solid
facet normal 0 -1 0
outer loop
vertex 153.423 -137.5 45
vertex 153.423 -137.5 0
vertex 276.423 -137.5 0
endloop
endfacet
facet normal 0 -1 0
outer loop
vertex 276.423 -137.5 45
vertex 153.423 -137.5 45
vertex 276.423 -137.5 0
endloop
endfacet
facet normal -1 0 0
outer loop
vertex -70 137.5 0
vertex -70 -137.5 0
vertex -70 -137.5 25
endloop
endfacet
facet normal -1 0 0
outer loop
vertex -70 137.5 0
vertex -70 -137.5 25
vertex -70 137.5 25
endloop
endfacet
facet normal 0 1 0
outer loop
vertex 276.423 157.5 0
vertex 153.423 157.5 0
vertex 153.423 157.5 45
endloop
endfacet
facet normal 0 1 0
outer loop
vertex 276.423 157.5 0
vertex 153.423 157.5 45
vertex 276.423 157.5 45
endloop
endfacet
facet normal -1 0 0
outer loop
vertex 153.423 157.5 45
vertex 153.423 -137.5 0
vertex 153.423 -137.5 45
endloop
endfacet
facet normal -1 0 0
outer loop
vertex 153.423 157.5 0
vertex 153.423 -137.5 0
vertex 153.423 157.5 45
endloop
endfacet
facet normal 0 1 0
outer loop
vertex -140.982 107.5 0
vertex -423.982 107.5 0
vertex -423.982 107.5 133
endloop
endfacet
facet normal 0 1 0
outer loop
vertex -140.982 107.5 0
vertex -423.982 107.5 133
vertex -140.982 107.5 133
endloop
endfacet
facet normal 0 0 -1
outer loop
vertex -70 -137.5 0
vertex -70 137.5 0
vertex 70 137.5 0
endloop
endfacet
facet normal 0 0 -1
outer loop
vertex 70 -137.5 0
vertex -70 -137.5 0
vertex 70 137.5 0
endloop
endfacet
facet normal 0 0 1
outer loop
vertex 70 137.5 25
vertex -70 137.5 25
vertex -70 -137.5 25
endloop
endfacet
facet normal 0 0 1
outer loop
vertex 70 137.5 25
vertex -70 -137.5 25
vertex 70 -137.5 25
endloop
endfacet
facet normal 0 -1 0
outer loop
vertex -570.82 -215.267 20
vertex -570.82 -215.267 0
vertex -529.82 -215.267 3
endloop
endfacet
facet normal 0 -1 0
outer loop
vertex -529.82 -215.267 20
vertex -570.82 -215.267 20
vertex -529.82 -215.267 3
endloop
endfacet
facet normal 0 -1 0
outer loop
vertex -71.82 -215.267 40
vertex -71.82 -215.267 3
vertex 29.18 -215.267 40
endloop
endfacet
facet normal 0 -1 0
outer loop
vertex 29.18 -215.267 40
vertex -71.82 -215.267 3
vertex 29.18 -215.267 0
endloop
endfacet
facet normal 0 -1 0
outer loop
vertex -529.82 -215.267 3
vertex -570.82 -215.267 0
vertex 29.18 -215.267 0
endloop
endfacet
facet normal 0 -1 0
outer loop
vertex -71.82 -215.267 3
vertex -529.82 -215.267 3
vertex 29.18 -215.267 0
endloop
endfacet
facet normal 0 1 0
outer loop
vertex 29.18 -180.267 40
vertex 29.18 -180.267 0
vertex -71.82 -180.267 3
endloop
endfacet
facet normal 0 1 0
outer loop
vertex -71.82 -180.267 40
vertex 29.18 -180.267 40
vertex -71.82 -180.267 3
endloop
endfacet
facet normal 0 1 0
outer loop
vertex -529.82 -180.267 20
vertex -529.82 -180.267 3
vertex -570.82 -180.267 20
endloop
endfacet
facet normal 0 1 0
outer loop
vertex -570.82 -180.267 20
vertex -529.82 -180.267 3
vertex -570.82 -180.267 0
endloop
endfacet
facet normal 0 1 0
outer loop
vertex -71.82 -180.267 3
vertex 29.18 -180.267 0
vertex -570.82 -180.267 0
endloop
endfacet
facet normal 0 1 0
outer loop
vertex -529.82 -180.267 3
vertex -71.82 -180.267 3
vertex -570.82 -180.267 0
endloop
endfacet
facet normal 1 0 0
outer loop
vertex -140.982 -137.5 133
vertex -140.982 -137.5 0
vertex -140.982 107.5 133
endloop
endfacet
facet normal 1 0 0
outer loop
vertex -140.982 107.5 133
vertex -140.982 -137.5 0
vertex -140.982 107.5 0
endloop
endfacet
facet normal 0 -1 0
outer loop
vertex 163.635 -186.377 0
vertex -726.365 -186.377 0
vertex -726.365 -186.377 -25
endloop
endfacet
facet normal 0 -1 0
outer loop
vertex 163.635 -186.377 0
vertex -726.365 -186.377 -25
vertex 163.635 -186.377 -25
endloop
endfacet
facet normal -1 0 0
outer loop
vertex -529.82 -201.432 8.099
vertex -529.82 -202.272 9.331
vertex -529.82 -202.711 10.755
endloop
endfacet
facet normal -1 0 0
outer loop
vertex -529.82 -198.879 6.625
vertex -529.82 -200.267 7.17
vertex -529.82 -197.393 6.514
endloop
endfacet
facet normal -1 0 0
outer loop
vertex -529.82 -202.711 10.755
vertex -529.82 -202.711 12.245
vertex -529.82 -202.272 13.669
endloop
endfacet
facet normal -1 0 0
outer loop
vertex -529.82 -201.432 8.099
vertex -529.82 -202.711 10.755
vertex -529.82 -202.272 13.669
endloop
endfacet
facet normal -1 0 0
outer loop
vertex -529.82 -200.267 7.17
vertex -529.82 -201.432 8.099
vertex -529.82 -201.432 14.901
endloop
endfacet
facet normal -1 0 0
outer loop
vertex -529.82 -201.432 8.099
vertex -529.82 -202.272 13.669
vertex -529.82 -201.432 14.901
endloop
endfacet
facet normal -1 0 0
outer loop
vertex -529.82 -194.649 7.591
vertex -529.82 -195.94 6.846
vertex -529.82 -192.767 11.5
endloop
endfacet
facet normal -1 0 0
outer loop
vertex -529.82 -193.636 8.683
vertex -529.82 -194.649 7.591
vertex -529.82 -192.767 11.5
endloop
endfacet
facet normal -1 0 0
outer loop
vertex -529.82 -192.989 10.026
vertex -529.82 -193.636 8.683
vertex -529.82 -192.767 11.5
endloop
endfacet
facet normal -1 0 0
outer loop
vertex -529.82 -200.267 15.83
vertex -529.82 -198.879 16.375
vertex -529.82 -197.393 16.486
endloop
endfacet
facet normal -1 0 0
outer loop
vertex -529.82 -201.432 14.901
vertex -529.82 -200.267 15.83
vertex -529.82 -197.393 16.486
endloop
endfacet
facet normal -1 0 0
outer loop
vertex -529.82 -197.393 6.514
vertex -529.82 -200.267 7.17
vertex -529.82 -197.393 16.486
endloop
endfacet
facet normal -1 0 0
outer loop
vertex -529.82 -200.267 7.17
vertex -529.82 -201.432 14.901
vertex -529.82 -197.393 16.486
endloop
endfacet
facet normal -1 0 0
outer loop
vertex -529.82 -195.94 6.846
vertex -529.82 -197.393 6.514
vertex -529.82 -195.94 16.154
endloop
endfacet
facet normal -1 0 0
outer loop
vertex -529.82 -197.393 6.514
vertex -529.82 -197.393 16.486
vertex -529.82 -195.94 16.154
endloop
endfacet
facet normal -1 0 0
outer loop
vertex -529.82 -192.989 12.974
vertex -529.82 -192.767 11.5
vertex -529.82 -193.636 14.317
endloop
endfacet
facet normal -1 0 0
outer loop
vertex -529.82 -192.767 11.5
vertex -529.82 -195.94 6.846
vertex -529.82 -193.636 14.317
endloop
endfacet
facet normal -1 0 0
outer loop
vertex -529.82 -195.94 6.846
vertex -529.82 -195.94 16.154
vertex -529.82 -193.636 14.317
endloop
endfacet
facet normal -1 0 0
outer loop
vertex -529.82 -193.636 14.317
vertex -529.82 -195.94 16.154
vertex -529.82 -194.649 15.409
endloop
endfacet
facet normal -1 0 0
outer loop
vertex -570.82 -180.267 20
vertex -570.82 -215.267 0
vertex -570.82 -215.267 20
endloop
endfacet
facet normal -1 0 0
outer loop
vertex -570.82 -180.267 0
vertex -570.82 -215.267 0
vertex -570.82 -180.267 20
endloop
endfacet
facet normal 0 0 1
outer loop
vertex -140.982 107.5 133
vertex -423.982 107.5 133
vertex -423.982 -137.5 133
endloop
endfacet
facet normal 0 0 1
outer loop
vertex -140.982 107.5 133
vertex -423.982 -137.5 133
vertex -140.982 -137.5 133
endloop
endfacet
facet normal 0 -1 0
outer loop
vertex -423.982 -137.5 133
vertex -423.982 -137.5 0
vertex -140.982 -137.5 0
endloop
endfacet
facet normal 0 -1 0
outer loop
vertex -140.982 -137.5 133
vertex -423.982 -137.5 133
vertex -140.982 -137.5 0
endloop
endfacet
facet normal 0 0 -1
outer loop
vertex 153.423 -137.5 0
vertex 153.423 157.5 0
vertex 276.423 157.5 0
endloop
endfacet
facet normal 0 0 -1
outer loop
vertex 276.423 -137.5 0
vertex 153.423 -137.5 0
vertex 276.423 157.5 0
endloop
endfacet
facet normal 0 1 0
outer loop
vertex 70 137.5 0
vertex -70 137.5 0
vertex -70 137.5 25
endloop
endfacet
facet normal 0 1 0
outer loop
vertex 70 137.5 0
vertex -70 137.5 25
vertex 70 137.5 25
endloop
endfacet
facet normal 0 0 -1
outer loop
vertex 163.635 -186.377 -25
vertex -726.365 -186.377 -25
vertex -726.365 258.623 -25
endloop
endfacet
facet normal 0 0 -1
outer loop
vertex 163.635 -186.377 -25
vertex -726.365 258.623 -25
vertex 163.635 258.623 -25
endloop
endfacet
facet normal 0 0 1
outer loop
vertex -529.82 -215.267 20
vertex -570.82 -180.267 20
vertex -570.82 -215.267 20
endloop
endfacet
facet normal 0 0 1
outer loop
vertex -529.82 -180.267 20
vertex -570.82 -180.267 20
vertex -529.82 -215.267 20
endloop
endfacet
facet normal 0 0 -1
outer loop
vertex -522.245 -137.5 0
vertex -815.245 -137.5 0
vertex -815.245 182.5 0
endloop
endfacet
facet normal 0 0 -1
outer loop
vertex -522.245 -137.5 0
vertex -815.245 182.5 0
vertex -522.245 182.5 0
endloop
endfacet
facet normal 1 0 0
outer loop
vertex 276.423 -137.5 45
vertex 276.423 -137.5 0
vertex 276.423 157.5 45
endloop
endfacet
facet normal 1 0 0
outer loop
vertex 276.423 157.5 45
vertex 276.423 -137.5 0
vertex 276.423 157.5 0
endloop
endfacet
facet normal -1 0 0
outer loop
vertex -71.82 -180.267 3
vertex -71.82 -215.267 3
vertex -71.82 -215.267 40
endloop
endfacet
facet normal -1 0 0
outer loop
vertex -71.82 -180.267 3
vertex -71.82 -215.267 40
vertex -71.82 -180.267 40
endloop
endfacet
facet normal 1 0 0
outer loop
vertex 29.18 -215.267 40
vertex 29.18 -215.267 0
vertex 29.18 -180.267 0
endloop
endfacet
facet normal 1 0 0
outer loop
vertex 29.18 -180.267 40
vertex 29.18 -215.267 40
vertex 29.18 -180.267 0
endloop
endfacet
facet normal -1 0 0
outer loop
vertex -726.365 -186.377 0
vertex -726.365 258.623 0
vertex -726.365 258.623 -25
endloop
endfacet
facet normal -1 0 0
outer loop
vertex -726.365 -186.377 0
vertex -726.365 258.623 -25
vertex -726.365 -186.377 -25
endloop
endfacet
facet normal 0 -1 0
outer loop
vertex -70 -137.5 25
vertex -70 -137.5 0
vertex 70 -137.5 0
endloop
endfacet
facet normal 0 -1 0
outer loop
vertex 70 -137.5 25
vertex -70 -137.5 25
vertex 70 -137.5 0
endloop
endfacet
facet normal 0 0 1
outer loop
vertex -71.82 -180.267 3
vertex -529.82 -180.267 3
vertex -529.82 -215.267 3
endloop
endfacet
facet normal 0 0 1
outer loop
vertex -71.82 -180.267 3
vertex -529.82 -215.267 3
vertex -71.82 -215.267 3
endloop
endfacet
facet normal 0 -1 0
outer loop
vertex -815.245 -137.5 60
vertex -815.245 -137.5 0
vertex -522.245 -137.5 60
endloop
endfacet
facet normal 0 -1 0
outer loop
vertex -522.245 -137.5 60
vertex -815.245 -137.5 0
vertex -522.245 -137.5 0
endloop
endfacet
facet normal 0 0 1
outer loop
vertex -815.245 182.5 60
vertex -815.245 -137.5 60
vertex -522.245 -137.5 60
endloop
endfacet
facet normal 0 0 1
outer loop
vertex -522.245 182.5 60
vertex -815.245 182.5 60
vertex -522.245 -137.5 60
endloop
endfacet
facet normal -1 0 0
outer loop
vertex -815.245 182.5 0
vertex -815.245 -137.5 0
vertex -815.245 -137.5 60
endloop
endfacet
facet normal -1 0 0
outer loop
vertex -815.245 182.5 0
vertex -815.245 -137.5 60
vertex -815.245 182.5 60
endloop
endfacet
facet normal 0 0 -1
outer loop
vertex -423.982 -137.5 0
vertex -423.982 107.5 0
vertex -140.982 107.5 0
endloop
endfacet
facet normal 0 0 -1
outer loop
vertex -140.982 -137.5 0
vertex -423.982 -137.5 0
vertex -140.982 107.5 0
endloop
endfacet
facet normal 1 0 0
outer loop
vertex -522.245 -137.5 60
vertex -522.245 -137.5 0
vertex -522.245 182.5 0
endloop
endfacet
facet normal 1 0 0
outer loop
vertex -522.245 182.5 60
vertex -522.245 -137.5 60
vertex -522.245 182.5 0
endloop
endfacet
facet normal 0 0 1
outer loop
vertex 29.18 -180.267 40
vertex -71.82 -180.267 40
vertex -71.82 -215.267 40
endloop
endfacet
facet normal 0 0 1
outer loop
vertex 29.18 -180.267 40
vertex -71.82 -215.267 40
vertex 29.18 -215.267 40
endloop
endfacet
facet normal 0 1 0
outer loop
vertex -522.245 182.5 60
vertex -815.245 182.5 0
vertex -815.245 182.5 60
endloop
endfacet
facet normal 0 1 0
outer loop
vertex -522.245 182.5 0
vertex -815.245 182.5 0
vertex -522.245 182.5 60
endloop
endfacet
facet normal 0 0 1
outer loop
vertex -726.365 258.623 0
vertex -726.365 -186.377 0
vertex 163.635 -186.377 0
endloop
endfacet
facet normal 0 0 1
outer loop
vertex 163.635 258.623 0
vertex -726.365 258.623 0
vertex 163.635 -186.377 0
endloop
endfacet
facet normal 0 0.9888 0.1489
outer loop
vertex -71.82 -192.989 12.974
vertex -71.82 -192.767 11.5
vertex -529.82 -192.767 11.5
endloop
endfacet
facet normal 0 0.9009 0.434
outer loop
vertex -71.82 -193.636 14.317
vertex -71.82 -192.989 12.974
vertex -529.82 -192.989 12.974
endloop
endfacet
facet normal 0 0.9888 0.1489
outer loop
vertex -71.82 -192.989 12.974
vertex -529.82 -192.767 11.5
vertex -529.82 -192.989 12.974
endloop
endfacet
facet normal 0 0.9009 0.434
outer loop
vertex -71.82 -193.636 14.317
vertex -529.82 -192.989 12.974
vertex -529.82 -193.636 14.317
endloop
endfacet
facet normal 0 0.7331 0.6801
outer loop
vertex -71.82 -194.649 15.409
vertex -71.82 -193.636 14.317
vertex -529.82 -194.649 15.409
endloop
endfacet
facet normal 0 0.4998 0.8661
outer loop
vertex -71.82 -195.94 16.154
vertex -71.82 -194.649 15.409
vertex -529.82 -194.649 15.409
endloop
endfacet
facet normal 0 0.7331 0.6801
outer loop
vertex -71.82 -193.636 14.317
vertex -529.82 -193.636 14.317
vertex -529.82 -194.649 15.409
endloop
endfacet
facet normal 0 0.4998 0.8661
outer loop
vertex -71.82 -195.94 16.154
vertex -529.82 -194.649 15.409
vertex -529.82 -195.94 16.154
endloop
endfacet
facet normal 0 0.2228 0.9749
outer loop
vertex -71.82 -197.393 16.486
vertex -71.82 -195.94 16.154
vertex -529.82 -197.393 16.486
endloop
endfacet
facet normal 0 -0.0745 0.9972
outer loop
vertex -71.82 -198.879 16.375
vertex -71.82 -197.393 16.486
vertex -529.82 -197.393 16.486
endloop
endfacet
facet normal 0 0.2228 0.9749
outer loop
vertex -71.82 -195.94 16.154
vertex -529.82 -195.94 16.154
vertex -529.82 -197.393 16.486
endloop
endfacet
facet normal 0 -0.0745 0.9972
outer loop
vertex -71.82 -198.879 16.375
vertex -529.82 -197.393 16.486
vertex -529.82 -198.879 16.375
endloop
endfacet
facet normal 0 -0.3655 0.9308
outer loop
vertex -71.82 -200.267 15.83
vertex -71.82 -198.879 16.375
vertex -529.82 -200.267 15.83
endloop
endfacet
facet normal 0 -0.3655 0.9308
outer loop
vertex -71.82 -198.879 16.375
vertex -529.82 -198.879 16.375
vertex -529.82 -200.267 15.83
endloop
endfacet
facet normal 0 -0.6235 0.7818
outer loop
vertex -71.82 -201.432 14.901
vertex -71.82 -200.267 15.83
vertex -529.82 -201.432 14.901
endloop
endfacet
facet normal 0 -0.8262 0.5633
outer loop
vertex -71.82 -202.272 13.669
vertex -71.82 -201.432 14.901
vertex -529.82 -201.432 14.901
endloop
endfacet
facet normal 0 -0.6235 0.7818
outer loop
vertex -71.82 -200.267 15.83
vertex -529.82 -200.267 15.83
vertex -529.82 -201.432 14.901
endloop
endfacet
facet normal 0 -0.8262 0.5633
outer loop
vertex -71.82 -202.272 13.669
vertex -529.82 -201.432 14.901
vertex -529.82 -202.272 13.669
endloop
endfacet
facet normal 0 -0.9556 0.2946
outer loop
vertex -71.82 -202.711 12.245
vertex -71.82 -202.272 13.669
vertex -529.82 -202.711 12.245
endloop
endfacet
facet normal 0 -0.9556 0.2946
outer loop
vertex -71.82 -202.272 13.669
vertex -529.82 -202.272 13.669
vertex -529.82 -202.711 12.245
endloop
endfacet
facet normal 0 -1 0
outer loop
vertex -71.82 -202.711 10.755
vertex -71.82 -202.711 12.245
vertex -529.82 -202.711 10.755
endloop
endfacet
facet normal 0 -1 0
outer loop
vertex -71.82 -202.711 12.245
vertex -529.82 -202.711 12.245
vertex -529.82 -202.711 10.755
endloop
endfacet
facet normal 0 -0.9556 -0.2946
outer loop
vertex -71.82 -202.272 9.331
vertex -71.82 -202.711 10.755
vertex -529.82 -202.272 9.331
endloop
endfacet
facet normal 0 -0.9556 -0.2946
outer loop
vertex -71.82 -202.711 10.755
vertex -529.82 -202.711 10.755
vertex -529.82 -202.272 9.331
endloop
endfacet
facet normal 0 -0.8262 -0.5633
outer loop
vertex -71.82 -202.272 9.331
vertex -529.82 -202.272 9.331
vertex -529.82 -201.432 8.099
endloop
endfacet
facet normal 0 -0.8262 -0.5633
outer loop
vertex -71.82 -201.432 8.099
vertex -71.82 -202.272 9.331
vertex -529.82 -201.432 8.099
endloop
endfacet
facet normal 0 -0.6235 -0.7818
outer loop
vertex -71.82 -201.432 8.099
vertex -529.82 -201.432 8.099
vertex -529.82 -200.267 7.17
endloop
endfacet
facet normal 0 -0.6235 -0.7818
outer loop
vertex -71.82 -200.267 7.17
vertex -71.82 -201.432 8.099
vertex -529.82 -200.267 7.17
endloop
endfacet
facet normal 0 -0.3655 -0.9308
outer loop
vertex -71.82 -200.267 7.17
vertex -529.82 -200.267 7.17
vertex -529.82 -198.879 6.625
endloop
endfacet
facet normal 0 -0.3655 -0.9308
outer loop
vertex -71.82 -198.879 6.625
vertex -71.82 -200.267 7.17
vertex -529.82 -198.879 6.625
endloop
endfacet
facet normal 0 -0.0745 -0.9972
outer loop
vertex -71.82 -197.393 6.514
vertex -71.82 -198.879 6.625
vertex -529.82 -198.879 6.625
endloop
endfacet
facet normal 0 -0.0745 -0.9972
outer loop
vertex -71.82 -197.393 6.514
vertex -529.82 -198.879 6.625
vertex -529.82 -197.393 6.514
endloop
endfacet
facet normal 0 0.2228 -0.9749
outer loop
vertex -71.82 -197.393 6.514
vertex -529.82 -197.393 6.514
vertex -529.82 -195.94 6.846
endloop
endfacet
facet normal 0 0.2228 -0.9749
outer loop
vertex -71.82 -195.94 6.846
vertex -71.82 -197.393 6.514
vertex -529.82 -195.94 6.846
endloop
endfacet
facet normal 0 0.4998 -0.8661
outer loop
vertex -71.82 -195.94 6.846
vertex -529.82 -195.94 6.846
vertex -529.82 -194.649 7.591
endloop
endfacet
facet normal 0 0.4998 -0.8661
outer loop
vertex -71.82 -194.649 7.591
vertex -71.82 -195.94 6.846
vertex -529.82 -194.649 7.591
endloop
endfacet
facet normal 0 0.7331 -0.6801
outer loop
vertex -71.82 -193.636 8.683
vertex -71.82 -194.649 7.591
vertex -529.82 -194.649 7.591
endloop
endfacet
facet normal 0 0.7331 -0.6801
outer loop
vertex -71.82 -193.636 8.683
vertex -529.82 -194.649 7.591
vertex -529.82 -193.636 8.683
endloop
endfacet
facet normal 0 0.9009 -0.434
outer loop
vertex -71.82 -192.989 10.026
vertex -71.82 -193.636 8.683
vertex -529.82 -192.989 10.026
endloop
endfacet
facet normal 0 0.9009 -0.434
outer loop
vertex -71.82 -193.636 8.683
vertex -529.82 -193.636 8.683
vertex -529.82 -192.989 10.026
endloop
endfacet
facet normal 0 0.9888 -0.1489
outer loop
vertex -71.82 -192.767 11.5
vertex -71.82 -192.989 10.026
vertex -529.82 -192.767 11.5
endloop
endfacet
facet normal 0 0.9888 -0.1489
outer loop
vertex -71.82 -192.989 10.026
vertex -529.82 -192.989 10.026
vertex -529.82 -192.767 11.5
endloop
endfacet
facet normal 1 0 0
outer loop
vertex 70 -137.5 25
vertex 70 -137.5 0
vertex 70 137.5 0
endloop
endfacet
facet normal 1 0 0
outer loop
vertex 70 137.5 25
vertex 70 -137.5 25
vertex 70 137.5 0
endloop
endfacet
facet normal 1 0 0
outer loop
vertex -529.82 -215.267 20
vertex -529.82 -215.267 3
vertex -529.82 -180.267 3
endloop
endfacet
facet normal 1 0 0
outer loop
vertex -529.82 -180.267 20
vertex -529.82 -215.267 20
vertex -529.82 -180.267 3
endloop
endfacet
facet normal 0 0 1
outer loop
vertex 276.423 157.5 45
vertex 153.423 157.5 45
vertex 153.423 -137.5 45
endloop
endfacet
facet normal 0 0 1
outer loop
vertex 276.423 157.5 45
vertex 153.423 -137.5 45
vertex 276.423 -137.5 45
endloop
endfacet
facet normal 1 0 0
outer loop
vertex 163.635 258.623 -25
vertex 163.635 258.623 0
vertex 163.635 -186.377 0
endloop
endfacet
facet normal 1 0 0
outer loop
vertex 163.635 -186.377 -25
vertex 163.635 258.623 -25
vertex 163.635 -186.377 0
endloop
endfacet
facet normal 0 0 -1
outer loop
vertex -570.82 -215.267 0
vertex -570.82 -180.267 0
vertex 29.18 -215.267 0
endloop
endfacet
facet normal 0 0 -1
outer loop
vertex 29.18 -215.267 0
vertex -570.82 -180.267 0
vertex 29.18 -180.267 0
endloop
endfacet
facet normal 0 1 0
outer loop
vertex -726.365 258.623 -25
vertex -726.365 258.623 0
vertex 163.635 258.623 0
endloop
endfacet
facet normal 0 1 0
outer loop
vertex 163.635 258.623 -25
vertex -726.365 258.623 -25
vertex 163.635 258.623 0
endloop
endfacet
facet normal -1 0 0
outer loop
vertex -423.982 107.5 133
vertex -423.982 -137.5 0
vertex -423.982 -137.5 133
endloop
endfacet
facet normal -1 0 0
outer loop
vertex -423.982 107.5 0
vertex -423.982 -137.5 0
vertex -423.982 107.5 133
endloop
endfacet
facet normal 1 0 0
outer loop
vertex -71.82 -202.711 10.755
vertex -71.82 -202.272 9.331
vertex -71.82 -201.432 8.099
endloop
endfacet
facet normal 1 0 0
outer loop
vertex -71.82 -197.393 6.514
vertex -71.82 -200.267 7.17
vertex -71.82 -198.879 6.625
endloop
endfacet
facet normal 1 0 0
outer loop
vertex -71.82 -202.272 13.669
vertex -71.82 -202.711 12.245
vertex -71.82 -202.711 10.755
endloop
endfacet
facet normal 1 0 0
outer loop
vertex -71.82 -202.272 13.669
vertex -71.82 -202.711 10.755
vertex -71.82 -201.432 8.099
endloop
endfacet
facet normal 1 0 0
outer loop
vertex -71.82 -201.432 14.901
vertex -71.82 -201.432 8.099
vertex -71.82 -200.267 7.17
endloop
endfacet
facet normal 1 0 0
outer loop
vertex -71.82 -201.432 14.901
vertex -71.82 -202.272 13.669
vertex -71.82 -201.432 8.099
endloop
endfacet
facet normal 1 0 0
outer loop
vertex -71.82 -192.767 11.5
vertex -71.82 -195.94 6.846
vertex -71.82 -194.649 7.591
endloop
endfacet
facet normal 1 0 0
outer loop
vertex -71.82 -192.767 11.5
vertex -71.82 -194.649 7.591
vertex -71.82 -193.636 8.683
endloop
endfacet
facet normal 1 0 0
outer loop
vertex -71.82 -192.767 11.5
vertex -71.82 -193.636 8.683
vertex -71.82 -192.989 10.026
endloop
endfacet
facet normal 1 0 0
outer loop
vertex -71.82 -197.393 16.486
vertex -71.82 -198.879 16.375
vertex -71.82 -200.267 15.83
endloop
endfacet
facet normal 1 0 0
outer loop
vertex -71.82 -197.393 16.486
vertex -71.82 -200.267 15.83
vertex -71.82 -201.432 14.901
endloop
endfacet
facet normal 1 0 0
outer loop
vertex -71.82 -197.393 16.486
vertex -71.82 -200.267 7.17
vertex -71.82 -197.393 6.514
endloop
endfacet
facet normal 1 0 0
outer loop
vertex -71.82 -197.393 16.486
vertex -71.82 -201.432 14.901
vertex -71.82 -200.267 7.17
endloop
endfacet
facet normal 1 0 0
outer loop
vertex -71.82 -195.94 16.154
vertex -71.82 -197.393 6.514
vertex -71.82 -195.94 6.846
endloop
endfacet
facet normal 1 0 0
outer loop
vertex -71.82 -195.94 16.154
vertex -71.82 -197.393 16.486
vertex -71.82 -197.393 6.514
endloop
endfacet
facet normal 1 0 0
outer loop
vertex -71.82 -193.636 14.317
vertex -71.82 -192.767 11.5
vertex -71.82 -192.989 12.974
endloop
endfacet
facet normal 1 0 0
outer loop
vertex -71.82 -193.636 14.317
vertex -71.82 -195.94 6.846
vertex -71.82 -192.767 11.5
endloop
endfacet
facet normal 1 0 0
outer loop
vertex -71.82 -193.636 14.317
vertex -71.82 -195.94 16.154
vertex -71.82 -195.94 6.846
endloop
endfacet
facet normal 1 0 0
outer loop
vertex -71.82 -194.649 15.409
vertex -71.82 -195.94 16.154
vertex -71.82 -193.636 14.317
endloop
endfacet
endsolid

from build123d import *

# Parameters (mm, degrees)
F0_W      = 140
F0_H      = 275
F1_DEPTH  = 25
F0_W_2    = 123
F0_H_2    = 295
F2_DEPTH  = 45
F0_W_3    = 293
F0_H_3    = 320
F3_DEPTH  = 60
F0_W_4    = 283
F0_H_4    = 245
F4_DEPTH  = 133
F5_W      = 890
F5_H      = 445
F6_DEPTH  = 25
F7_W      = 458
F7_H      = 35
F7_W_2    = 41
F7_W_3    = 101
F8_DEPTH  = 3
F9_DEPTH  = 20
F10_DEPTH = 40
F11_R     = 5
F12_DEPTH = 458


with BuildPart() as f1:
    # F0 (on Top) → F1 (new body)
    with BuildSketch(Plane.XY):
        Rectangle(F0_W, F0_H)
    extrude(amount=F1_DEPTH)


with BuildPart() as f2:
    # F0 (on Top) → F2 (new body)
    with BuildSketch(Plane.XY):
        with Locations((214.9233075308, 10)):
            Rectangle(F0_W_2, F0_H_2)
    extrude(amount=F2_DEPTH)


with BuildPart() as f3:
    # F0 (on Top) → F3 (new body)
    with BuildSketch(Plane.XY):
        with Locations((-668.7453899384, 22.5)):
            Rectangle(F0_W_3, F0_H_3)
    extrude(amount=F3_DEPTH)


with BuildPart() as f4:
    # F0 (on Top) → F4 (new body)
    with BuildSketch(Plane.XY):
        with Locations((-282.4815473557, -15)):
            Rectangle(F0_W_4, F0_H_4)
    extrude(amount=F4_DEPTH)


with BuildPart() as f6:
    # F5 (on face) → F6 (new body)
    with BuildSketch(Plane(origin=(0, 0, 0), x_dir=(1, 0, 0), z_dir=(0, 0, -1))):
        with Locations((-281.3649100065, -36.1232197285)):
            Rectangle(F5_W, F5_H)
    extrude(amount=F6_DEPTH)


with BuildPart() as f8:
    # F7 (on Top) → F8 (new body)
    with BuildSketch(Plane.XY):
        with Locations((-300.8197906613, -197.7667400182)):
            Rectangle(F7_W, F7_H)
        with Locations((-550.3197906613, -197.7667400182)):
            Rectangle(F7_W_2, F7_H)
        with Locations((-21.3197906613, -197.7667400182)):
            Rectangle(F7_W_3, F7_H)
    extrude(amount=F8_DEPTH)

    # F7 (on Top) → F9 (join)
    with BuildSketch(Plane.XY):
        with Locations((-550.3197906613, -197.7667400182)):
            Rectangle(F7_W_2, F7_H)
    extrude(amount=F9_DEPTH)

    # F7 (on Top) → F10 (join)
    with BuildSketch(Plane.XY):
        with Locations((-21.3197906613, -197.7667400182)):
            Rectangle(F7_W_3, F7_H)
    extrude(amount=F10_DEPTH)


with BuildPart() as f12:
    # F11 (on face) → F12 (new body, through all)
    with BuildSketch(Plane.YZ.offset(-529.8197906613)):
        with Locations((-197.7667400182, 11.5)):
            Circle(F11_R)
    extrude(amount=F12_DEPTH)


solid = Compound([f1.part, f2.part, f3.part, f4.part, f6.part, f8.part, f12.part])
